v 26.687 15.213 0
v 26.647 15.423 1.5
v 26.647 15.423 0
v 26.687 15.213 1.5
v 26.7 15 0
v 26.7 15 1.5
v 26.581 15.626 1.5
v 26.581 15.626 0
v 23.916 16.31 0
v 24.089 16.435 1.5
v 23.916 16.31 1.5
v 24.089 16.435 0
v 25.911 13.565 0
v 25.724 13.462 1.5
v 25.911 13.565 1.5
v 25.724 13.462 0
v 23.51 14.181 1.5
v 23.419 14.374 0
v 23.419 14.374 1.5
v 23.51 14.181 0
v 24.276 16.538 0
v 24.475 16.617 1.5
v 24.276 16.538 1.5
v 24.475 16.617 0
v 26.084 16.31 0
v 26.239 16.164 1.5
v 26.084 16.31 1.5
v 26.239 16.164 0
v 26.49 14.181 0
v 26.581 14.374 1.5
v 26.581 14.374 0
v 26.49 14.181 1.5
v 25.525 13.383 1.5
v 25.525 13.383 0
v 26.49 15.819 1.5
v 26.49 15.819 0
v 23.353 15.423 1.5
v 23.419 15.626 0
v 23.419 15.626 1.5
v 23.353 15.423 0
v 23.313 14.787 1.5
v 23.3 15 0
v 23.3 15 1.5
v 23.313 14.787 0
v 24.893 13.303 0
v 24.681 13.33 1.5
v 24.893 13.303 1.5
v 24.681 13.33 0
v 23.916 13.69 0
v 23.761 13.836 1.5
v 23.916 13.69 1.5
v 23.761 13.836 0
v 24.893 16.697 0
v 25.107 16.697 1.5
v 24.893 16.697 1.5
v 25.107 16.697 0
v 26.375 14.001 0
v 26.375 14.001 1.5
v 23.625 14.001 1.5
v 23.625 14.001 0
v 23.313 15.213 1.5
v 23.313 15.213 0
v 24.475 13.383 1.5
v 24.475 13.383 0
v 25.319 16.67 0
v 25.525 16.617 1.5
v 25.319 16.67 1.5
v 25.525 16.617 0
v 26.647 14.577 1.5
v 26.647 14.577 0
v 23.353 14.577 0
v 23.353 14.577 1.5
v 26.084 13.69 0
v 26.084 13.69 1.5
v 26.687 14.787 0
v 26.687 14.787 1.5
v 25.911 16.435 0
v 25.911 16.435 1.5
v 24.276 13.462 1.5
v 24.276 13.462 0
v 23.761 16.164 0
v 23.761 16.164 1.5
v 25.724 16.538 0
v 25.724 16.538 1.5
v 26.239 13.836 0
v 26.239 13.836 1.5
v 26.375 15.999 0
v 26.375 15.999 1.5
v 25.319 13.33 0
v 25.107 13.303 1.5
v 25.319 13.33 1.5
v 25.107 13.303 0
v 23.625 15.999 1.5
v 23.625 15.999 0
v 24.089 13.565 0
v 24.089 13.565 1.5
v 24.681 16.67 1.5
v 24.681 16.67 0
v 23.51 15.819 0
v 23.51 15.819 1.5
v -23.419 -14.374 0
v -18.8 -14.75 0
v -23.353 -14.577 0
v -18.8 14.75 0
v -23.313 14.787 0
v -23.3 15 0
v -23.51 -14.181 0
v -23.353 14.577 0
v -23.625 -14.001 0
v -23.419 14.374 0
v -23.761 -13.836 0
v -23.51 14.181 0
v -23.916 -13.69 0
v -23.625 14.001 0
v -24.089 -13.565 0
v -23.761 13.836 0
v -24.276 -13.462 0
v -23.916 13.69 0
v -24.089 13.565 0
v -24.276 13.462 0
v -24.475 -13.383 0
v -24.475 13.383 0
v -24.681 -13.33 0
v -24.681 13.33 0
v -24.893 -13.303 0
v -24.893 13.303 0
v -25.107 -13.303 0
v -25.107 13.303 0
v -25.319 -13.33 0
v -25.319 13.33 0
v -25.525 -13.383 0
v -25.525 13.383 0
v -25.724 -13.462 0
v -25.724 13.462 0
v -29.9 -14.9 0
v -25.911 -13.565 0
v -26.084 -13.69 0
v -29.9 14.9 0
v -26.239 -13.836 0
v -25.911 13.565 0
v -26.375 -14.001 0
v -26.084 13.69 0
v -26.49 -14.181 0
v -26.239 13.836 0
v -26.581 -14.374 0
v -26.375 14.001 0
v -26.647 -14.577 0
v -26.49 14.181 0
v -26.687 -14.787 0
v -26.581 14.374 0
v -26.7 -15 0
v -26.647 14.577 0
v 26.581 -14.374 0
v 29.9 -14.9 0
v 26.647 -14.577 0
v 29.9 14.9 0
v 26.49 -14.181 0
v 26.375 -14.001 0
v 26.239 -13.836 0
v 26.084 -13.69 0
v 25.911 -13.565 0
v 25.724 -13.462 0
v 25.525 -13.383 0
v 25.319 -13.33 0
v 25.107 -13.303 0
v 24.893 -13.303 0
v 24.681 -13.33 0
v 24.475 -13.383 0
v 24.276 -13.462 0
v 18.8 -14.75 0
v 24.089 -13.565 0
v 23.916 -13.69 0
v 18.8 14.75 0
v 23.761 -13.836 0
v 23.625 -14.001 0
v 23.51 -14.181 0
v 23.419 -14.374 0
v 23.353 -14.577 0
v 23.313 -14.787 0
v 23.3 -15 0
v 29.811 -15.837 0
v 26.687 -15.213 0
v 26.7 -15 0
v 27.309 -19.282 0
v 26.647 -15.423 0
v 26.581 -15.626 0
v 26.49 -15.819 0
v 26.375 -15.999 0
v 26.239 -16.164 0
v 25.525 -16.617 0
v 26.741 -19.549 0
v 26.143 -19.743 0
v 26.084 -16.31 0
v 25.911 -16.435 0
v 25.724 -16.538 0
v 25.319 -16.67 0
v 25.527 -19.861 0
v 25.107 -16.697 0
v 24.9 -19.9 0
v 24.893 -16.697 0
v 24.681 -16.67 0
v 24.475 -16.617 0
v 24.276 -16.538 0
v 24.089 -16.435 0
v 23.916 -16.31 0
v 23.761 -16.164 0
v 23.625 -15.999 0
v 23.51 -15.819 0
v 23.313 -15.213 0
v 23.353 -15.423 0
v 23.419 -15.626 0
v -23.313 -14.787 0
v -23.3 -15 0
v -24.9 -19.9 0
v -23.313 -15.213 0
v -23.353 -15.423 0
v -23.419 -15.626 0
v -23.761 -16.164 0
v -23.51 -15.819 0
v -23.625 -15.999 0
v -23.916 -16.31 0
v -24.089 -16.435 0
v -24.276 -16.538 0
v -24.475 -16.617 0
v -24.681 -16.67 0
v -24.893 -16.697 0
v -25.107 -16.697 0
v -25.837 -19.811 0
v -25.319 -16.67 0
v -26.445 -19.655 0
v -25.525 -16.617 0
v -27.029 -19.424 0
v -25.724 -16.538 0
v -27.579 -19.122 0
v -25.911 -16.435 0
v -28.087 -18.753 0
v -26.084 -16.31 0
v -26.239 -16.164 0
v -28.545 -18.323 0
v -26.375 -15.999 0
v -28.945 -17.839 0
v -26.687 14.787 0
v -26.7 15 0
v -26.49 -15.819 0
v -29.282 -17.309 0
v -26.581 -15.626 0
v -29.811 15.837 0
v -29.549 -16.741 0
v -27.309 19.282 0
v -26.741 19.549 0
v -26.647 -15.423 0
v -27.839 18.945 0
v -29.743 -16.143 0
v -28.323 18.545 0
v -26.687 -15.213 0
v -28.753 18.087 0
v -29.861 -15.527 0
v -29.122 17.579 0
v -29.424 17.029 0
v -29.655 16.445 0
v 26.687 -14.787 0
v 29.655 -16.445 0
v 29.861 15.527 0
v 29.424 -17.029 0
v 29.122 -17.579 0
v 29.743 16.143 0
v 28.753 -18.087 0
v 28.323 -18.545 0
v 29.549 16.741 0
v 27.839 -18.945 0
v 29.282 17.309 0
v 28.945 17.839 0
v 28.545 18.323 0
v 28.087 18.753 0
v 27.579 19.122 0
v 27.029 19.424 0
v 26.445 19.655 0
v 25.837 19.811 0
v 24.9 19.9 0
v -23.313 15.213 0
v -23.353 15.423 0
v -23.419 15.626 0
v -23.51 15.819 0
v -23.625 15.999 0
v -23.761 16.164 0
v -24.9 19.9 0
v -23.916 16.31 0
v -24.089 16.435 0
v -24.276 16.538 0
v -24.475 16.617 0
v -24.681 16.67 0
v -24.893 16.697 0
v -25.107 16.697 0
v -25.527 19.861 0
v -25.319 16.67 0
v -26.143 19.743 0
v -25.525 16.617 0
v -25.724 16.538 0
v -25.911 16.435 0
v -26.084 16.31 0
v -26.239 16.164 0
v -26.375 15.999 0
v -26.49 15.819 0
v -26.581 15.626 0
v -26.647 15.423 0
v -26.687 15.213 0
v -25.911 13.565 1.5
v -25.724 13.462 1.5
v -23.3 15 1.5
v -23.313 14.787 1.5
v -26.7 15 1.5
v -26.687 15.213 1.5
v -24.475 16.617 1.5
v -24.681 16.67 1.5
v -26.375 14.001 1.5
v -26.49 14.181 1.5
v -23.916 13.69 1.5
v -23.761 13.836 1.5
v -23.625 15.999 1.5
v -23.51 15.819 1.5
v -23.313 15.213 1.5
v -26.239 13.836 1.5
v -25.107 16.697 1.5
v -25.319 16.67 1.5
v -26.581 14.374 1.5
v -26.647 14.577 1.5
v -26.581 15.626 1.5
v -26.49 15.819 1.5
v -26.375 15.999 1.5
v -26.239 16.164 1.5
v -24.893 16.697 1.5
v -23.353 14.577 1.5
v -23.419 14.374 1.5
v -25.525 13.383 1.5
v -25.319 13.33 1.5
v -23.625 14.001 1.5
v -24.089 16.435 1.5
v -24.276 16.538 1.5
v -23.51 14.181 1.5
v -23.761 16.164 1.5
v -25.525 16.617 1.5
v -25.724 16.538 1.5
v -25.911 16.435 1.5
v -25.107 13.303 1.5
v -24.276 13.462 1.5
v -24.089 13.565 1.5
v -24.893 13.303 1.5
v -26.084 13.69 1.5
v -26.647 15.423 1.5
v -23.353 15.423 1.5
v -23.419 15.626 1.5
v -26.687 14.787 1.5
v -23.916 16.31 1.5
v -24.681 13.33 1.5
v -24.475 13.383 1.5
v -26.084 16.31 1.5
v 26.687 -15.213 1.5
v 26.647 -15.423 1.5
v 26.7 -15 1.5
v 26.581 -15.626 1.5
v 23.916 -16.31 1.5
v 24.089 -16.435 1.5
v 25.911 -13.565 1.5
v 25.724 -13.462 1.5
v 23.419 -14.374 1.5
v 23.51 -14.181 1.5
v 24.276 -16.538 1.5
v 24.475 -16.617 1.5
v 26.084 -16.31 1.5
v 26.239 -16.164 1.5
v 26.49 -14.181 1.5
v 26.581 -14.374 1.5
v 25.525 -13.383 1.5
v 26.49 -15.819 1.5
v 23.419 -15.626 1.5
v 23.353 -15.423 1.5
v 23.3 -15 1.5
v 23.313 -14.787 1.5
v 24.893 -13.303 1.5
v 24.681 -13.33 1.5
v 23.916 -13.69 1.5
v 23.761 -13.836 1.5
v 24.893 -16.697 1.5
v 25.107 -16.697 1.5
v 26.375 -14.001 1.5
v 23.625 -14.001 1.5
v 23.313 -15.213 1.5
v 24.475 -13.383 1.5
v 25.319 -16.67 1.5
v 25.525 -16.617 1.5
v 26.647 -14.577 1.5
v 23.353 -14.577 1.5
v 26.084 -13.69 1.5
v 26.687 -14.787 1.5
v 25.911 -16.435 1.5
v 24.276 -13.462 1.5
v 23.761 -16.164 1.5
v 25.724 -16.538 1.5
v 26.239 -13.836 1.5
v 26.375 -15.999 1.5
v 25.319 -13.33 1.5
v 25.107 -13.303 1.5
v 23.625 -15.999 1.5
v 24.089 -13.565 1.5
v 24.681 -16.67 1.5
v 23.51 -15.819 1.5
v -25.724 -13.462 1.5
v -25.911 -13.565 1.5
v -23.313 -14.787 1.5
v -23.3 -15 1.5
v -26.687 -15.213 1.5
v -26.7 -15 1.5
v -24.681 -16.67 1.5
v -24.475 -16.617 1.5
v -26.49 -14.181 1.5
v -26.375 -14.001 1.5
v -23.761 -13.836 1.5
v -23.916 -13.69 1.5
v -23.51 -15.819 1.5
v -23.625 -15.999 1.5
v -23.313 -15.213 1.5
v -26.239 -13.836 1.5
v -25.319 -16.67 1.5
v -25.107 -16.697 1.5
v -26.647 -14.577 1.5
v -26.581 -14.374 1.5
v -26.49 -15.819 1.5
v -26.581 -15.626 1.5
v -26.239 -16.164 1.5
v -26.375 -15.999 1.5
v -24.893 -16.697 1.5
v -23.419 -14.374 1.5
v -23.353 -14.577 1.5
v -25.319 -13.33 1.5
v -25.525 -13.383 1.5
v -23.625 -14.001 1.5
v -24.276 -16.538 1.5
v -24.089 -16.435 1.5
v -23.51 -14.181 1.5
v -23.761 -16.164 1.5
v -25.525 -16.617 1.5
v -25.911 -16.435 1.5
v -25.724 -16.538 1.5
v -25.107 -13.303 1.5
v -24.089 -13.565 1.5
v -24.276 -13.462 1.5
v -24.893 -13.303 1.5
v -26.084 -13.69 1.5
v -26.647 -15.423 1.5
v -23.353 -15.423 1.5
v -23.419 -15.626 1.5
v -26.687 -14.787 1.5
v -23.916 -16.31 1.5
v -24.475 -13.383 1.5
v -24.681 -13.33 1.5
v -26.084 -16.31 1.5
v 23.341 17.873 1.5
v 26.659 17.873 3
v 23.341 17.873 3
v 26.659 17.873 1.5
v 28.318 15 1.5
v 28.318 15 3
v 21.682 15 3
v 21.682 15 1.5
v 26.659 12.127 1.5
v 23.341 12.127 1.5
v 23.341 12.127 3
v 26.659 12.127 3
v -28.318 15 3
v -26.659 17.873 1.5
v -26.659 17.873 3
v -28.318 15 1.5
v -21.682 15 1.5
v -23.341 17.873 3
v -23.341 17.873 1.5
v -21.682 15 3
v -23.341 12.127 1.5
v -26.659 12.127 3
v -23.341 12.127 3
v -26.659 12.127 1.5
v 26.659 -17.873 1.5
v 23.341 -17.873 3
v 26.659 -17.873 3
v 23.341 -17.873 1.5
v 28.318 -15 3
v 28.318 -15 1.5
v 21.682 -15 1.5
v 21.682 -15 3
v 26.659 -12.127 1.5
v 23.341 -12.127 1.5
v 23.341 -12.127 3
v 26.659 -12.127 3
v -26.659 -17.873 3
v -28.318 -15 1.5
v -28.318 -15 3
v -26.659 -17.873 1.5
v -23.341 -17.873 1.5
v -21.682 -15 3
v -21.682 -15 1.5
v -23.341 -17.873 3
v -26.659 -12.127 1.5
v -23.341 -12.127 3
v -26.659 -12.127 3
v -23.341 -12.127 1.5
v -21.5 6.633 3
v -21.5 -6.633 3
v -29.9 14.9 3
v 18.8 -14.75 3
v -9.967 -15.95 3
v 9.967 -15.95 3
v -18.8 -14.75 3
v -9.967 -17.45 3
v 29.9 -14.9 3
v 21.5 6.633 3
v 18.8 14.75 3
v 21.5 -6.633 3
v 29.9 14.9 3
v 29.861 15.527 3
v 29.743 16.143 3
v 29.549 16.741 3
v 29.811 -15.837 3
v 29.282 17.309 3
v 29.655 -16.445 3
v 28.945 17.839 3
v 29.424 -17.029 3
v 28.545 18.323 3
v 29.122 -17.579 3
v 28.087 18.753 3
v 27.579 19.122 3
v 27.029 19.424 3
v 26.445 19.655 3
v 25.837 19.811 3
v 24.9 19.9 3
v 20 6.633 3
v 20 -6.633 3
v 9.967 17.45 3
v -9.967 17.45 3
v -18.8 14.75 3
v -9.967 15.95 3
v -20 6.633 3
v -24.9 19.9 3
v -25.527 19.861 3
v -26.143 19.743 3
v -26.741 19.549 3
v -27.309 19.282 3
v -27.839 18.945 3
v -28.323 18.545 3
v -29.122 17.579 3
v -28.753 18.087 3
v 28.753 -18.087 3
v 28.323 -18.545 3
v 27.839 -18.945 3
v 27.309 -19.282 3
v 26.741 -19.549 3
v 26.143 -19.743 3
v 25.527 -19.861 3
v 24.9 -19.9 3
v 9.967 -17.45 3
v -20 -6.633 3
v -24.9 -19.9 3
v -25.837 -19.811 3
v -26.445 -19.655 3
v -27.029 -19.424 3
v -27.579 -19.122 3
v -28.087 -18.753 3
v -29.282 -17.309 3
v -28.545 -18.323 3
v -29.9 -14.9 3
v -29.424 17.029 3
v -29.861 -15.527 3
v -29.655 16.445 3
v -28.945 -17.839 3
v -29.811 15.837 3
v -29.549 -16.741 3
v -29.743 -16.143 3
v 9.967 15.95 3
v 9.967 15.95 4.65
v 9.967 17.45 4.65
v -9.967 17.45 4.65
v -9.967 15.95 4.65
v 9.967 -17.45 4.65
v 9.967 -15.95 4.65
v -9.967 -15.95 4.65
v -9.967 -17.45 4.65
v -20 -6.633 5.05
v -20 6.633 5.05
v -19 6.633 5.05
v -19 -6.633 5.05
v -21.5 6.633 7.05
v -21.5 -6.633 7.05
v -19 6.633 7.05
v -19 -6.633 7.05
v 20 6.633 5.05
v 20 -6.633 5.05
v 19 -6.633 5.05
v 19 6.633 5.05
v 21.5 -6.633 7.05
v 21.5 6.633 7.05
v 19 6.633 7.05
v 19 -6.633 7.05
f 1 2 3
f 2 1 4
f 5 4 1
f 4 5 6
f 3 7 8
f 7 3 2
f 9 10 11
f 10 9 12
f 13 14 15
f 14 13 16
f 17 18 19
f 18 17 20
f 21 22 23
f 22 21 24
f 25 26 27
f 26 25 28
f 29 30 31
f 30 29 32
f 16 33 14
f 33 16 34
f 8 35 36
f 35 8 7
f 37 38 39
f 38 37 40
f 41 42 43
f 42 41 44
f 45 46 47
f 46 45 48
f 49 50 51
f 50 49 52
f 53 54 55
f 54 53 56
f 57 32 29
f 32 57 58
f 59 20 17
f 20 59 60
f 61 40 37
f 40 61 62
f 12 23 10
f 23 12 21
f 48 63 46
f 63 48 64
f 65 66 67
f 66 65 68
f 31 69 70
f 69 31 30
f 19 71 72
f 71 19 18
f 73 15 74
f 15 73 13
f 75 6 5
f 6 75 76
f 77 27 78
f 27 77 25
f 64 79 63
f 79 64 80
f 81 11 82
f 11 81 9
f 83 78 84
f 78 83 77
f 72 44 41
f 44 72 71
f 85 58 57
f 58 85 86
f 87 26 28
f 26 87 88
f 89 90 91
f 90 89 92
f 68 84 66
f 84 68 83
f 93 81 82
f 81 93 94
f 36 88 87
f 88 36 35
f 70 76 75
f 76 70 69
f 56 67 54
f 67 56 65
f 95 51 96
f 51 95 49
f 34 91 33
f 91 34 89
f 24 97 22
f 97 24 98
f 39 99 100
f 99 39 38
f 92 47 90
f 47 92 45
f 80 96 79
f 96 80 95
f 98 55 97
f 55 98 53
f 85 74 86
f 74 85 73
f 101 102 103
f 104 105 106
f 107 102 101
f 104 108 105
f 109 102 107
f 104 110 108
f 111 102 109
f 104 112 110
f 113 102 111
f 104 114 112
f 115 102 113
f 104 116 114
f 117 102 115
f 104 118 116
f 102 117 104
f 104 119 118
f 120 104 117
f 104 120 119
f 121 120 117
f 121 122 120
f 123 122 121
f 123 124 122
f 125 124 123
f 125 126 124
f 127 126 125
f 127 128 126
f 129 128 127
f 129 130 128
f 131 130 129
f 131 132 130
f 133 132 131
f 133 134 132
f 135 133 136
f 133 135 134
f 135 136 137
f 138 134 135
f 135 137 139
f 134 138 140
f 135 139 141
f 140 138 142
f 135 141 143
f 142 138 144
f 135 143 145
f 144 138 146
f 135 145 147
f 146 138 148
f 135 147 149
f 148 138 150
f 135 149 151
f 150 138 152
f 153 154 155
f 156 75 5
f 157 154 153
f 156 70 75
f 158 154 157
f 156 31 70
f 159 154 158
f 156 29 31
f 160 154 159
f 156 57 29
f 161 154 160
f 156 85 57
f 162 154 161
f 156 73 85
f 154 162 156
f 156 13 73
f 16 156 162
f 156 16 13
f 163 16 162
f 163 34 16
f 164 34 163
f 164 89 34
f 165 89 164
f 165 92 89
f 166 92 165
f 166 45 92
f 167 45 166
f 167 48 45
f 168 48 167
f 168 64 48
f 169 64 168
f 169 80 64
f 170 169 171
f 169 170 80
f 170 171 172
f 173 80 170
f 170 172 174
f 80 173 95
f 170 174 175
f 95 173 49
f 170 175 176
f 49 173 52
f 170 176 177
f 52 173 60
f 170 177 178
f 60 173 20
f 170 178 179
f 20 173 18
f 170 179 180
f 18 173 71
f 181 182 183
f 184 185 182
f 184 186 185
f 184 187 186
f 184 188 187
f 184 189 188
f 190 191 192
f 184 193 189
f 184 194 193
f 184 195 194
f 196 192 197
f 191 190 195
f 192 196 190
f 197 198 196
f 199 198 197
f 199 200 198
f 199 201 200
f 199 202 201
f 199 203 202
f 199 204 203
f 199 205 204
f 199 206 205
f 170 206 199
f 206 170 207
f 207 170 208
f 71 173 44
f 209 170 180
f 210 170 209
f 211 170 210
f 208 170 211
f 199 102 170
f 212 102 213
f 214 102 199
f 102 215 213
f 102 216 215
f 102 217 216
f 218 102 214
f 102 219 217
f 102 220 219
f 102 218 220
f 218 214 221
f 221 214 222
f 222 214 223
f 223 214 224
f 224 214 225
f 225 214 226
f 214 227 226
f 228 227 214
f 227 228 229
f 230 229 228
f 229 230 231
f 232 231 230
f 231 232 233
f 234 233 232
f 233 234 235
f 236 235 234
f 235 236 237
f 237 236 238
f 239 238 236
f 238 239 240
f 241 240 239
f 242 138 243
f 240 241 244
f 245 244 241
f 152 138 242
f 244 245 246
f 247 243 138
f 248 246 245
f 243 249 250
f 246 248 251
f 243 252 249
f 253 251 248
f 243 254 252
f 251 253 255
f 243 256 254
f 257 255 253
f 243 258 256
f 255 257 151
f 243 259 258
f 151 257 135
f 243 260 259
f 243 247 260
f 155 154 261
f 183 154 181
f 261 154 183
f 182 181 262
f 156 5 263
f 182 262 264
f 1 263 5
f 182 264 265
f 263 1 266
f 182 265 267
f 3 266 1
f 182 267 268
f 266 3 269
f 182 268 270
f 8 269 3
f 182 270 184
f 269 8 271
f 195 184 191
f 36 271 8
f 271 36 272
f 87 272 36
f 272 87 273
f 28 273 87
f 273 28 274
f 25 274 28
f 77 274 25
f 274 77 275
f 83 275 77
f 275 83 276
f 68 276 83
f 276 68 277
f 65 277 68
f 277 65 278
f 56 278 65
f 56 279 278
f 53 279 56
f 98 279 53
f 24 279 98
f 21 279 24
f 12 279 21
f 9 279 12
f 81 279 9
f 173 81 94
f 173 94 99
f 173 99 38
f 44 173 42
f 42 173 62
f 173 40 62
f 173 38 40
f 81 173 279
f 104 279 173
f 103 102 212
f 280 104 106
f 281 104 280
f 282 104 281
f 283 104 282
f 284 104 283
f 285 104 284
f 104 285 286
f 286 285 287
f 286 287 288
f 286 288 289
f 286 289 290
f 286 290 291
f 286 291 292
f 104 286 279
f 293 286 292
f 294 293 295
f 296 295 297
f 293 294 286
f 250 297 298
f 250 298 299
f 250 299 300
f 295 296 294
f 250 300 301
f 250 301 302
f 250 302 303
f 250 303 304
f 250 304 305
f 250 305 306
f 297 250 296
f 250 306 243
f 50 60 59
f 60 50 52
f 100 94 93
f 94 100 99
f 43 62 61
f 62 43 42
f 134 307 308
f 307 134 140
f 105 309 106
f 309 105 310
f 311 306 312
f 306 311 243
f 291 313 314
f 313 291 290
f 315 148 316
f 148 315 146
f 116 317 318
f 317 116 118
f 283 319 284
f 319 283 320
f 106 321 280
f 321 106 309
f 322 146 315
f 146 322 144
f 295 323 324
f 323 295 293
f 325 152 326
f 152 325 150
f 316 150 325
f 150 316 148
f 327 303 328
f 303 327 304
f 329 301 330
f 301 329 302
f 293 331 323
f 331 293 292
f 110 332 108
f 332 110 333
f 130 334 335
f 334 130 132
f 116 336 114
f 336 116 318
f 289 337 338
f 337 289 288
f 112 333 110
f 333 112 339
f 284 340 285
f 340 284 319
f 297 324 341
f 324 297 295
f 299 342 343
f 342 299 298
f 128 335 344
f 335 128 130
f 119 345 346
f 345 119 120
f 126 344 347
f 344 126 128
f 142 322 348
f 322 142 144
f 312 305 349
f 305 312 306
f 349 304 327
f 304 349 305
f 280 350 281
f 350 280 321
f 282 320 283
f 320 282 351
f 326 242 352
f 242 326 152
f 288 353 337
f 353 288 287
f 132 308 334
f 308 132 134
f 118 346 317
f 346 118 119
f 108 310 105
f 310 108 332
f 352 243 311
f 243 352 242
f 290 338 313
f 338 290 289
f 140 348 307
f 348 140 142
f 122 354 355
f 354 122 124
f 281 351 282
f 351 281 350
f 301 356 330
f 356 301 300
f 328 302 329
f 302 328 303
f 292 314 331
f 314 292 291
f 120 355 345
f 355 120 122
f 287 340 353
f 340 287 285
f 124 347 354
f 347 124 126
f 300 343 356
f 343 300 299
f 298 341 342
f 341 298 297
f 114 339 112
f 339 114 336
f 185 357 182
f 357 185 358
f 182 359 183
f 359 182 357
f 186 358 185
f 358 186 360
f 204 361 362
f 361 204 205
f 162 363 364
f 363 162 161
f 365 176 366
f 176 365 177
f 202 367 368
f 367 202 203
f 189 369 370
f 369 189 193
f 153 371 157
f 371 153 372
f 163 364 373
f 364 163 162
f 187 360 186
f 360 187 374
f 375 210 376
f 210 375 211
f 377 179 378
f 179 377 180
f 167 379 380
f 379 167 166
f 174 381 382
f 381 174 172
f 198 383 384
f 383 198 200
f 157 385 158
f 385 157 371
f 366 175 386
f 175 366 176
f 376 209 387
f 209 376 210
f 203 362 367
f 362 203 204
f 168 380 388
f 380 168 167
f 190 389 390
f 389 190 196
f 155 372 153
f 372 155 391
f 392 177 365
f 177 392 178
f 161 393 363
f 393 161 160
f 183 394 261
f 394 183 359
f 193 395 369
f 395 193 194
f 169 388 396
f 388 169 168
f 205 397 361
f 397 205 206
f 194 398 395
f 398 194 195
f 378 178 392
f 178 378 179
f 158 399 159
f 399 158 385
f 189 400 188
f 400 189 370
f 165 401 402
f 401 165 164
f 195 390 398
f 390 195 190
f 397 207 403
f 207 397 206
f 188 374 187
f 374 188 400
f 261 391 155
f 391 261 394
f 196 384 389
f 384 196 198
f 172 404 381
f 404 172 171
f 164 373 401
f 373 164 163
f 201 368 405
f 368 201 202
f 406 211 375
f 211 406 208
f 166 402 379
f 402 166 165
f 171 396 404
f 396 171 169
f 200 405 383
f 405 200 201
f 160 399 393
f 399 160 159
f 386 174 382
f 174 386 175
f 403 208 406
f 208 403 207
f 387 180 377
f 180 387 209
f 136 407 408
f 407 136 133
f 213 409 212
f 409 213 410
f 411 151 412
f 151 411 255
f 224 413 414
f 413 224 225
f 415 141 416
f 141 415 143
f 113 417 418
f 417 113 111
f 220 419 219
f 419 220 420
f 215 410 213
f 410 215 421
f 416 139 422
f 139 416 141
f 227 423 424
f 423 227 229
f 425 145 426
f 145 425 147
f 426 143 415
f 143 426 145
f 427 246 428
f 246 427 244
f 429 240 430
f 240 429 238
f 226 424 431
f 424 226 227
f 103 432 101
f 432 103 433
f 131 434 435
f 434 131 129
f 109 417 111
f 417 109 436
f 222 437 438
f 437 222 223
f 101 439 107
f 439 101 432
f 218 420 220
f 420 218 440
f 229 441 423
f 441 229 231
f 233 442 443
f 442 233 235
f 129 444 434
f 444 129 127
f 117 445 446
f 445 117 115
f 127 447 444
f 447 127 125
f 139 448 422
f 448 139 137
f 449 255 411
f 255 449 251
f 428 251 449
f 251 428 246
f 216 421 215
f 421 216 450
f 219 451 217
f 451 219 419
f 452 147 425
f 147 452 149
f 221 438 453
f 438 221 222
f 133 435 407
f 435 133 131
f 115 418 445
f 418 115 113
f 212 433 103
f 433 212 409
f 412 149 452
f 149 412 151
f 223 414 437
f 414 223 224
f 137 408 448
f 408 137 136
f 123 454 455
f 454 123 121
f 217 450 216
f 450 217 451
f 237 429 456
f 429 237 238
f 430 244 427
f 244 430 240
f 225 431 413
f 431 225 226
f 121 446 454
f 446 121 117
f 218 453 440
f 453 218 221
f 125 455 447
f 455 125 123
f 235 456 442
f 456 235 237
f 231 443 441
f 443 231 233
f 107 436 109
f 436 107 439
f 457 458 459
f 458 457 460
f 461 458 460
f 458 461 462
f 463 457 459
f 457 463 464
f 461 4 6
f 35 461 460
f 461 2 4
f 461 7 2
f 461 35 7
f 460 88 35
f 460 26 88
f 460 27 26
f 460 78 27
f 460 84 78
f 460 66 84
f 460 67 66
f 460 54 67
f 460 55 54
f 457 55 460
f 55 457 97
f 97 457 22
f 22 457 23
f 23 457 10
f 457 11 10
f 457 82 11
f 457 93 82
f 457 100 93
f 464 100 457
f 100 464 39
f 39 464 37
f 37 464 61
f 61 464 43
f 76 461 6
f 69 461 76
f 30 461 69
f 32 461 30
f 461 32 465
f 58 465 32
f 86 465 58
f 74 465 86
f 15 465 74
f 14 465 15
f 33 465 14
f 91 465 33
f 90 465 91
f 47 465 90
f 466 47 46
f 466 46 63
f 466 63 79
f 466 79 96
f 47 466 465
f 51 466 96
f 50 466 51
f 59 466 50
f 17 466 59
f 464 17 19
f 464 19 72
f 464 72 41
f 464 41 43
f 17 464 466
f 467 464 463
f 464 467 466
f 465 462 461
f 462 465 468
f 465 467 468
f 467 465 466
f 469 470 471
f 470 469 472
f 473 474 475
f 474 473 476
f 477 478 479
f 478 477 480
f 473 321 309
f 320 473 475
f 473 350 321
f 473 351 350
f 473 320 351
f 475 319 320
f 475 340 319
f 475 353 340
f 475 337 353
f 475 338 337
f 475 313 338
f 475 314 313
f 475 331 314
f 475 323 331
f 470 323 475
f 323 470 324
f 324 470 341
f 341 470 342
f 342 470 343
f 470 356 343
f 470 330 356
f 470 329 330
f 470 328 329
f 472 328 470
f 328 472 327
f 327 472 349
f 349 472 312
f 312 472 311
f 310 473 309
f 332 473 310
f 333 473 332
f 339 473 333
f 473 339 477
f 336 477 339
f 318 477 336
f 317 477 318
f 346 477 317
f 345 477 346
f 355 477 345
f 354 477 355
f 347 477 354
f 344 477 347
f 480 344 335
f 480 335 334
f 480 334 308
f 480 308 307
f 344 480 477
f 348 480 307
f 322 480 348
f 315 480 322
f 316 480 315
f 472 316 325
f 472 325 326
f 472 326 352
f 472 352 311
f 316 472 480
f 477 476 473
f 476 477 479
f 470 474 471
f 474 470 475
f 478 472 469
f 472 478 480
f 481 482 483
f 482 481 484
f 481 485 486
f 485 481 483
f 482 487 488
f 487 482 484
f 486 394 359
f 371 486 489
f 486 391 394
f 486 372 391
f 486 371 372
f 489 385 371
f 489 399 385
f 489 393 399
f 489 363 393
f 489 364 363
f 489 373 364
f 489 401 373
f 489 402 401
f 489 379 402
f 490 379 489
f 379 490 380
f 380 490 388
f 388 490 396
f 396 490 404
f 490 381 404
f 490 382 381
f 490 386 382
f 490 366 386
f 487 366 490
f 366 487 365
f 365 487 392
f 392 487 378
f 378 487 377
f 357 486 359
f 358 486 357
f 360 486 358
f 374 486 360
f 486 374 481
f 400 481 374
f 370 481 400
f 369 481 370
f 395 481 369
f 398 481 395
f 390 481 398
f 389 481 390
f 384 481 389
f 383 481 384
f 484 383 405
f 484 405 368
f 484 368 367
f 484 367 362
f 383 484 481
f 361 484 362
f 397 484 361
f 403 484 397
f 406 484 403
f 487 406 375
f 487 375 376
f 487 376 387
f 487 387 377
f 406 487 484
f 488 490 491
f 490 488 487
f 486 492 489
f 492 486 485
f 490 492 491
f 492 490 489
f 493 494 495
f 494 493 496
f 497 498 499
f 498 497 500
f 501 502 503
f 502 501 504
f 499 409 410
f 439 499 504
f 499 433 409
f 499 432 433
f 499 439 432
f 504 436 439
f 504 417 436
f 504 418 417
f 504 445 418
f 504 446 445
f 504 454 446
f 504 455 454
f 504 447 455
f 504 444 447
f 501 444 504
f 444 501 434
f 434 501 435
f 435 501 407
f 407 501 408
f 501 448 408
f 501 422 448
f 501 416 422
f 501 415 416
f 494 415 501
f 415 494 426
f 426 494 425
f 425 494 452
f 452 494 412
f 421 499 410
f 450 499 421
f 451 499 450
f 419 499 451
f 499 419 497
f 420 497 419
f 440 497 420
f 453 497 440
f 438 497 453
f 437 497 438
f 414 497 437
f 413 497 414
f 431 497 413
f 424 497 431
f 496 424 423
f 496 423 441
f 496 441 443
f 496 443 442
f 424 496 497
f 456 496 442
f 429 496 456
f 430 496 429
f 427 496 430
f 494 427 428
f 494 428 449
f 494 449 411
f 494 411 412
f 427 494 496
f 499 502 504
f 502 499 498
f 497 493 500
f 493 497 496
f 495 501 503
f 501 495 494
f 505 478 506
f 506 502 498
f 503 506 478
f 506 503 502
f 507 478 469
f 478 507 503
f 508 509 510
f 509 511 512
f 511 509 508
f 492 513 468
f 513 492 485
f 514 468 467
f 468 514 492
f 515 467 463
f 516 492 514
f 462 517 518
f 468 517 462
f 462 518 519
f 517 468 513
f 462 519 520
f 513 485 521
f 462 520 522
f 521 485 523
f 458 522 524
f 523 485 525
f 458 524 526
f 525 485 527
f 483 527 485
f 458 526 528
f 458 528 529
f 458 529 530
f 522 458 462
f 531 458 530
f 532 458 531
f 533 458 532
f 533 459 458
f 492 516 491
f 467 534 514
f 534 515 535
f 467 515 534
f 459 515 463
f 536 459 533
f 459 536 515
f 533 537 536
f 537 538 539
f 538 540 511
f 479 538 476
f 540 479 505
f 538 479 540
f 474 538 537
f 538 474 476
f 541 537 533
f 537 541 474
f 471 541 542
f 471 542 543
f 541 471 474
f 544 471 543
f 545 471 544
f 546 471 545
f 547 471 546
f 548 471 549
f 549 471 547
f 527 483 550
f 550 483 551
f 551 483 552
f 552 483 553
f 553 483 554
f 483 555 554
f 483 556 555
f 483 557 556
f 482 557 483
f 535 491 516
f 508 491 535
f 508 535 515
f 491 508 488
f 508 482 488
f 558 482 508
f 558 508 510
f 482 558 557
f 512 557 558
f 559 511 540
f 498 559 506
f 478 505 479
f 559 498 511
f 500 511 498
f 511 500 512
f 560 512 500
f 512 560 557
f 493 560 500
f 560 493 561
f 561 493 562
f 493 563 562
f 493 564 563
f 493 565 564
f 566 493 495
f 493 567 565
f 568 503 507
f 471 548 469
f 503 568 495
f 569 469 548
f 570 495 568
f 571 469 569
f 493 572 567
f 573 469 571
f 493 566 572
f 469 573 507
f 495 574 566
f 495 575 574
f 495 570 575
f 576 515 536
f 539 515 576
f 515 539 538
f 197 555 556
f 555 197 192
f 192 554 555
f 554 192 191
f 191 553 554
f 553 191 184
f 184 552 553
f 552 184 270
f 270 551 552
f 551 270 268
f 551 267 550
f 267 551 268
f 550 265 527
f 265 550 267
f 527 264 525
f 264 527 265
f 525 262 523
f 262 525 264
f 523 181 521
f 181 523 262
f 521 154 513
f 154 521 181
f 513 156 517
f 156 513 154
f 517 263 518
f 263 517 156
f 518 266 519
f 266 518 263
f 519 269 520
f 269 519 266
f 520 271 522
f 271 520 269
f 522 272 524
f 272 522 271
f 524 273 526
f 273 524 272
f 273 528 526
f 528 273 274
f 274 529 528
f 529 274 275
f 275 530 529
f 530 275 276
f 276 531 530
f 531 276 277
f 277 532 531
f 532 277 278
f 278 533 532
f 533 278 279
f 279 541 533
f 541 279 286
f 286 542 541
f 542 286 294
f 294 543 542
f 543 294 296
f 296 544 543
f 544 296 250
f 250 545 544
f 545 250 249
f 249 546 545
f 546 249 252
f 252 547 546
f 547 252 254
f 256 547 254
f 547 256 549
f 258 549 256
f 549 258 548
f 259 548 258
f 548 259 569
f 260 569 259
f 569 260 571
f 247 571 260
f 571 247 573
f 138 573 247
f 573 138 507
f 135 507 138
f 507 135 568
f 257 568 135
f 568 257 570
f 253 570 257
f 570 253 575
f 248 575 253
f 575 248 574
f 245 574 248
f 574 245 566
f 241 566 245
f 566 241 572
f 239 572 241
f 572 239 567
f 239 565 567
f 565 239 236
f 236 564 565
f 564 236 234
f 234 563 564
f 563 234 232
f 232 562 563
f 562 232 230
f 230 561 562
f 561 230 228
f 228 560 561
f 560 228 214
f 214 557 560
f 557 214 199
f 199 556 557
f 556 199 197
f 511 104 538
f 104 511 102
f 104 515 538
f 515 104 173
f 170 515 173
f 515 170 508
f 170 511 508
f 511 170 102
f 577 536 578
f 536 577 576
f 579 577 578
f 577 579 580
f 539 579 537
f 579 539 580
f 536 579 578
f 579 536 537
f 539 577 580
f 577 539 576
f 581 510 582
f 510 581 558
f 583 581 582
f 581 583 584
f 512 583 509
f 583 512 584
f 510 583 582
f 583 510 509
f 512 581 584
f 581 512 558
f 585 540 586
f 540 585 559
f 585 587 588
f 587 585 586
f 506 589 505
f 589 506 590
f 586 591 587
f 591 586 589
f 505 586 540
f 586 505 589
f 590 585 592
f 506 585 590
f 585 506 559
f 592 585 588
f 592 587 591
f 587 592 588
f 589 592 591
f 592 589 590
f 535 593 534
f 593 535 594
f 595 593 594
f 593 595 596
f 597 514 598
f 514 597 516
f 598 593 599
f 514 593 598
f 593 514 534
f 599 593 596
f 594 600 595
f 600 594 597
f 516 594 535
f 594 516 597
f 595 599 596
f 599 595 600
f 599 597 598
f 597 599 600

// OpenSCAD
/* [PCB selection - NOT WORKING YET] */
your_pcb="foo"; // [arduino_uno, arduino_mega, rp4]

////////////////////////////////////////////////////////////////////////////////
/* [Main parameters] */
grid_spacing = 10;

pcb_width=39.6;
pcb_depth = 31.5;
pcb_height = 1.65;

////////////////////////////////////////////////////////////////////////////////
/* [Secondary parameters] */
hole_diam = 3; // for screw
nut_min_diam = 5.4; // for nuts
tolerance = 0.2; //used fo 3D printing
min_border = 1.5; //minimal dist. from nut to the outter border of the board
pcb_offset = 1; //protruding border below the pcb

////////////////////////////////////////////////////////////////////////////////
/* [Change at your own risks] */
fillet_radius = 5;
nut_max_diam = nut_min_diam*2/sqrt(3);
board_height = 3;
board_width_min = ceil(pcb_width+(nut_max_diam+tolerance*2+min_border)*2+min_border*2);
board_width = ceil(board_width_min/grid_spacing)*grid_spacing-tolerance;
holes_dist_width_min = ceil(pcb_width+(nut_max_diam+tolerance*2)+min_border*2);
holes_dist_width = ceil(holes_dist_width_min/grid_spacing)*grid_spacing;
board_depth_min = ceil(pcb_depth+min_border*2);
board_depth = ceil(board_depth_min/grid_spacing)*grid_spacing-tolerance;
holes_dist_depth_min = floor(pcb_depth-(nut_max_diam+tolerance*2)/2-min_border*2);
holes_dist_depth = ceil(holes_dist_depth_min/grid_spacing)*grid_spacing;
tab_length = board_width/3;
L_tab_length = board_depth/3;
L_hook = 1;

////////////////////////////////////////////////////////////////////////////////
/*Code*/

// Module for symmetry
module mirror_copy(v = [1, 0, 0]) {
    children();
    mirror(v) children();}

// Board with holes
difference(){
    // Create the board
    linear_extrude(height = board_height) {
        difference() {
            offset($fn=50, r = fillet_radius) {
                square([board_width-fillet_radius*2,board_depth-fillet_radius*2],center=true);}
                square([pcb_width-pcb_offset*2,pcb_depth-pcb_offset*2],center=true);}}
                // holes
                mirror_copy([0, 1, 0])
                mirror_copy()
                translate([holes_dist_width/2,holes_dist_depth/2,0]){
                    cylinder($fn=50, h=board_height*2, r=hole_diam/2+tolerance);}
                    // nut holes
                    mirror_copy([0, 1, 0])
                    mirror_copy()
                    translate([holes_dist_width/2,holes_dist_depth/2,board_height/2]){
                        cylinder($fn=6, h=board_height*2, r=(nut_max_diam/2+tolerance));}}

//simple tabs
mirror_copy([0, 1, 0])
translate([-tab_length/2,pcb_depth/2+tolerance,board_height]){
cube([tab_length, min_border, pcb_height], center=false);}

//L tabs
mirror_copy([1, 0, 0])
translate([-pcb_width/2-tolerance-min_border,-L_tab_length/2,board_height]){
    cube([min_border, L_tab_length, pcb_height+tolerance*2]);
    translate([0,0,pcb_height+tolerance*2]){
        cube([min_border+L_hook, L_tab_length, 2]);}}
// THE END
 
